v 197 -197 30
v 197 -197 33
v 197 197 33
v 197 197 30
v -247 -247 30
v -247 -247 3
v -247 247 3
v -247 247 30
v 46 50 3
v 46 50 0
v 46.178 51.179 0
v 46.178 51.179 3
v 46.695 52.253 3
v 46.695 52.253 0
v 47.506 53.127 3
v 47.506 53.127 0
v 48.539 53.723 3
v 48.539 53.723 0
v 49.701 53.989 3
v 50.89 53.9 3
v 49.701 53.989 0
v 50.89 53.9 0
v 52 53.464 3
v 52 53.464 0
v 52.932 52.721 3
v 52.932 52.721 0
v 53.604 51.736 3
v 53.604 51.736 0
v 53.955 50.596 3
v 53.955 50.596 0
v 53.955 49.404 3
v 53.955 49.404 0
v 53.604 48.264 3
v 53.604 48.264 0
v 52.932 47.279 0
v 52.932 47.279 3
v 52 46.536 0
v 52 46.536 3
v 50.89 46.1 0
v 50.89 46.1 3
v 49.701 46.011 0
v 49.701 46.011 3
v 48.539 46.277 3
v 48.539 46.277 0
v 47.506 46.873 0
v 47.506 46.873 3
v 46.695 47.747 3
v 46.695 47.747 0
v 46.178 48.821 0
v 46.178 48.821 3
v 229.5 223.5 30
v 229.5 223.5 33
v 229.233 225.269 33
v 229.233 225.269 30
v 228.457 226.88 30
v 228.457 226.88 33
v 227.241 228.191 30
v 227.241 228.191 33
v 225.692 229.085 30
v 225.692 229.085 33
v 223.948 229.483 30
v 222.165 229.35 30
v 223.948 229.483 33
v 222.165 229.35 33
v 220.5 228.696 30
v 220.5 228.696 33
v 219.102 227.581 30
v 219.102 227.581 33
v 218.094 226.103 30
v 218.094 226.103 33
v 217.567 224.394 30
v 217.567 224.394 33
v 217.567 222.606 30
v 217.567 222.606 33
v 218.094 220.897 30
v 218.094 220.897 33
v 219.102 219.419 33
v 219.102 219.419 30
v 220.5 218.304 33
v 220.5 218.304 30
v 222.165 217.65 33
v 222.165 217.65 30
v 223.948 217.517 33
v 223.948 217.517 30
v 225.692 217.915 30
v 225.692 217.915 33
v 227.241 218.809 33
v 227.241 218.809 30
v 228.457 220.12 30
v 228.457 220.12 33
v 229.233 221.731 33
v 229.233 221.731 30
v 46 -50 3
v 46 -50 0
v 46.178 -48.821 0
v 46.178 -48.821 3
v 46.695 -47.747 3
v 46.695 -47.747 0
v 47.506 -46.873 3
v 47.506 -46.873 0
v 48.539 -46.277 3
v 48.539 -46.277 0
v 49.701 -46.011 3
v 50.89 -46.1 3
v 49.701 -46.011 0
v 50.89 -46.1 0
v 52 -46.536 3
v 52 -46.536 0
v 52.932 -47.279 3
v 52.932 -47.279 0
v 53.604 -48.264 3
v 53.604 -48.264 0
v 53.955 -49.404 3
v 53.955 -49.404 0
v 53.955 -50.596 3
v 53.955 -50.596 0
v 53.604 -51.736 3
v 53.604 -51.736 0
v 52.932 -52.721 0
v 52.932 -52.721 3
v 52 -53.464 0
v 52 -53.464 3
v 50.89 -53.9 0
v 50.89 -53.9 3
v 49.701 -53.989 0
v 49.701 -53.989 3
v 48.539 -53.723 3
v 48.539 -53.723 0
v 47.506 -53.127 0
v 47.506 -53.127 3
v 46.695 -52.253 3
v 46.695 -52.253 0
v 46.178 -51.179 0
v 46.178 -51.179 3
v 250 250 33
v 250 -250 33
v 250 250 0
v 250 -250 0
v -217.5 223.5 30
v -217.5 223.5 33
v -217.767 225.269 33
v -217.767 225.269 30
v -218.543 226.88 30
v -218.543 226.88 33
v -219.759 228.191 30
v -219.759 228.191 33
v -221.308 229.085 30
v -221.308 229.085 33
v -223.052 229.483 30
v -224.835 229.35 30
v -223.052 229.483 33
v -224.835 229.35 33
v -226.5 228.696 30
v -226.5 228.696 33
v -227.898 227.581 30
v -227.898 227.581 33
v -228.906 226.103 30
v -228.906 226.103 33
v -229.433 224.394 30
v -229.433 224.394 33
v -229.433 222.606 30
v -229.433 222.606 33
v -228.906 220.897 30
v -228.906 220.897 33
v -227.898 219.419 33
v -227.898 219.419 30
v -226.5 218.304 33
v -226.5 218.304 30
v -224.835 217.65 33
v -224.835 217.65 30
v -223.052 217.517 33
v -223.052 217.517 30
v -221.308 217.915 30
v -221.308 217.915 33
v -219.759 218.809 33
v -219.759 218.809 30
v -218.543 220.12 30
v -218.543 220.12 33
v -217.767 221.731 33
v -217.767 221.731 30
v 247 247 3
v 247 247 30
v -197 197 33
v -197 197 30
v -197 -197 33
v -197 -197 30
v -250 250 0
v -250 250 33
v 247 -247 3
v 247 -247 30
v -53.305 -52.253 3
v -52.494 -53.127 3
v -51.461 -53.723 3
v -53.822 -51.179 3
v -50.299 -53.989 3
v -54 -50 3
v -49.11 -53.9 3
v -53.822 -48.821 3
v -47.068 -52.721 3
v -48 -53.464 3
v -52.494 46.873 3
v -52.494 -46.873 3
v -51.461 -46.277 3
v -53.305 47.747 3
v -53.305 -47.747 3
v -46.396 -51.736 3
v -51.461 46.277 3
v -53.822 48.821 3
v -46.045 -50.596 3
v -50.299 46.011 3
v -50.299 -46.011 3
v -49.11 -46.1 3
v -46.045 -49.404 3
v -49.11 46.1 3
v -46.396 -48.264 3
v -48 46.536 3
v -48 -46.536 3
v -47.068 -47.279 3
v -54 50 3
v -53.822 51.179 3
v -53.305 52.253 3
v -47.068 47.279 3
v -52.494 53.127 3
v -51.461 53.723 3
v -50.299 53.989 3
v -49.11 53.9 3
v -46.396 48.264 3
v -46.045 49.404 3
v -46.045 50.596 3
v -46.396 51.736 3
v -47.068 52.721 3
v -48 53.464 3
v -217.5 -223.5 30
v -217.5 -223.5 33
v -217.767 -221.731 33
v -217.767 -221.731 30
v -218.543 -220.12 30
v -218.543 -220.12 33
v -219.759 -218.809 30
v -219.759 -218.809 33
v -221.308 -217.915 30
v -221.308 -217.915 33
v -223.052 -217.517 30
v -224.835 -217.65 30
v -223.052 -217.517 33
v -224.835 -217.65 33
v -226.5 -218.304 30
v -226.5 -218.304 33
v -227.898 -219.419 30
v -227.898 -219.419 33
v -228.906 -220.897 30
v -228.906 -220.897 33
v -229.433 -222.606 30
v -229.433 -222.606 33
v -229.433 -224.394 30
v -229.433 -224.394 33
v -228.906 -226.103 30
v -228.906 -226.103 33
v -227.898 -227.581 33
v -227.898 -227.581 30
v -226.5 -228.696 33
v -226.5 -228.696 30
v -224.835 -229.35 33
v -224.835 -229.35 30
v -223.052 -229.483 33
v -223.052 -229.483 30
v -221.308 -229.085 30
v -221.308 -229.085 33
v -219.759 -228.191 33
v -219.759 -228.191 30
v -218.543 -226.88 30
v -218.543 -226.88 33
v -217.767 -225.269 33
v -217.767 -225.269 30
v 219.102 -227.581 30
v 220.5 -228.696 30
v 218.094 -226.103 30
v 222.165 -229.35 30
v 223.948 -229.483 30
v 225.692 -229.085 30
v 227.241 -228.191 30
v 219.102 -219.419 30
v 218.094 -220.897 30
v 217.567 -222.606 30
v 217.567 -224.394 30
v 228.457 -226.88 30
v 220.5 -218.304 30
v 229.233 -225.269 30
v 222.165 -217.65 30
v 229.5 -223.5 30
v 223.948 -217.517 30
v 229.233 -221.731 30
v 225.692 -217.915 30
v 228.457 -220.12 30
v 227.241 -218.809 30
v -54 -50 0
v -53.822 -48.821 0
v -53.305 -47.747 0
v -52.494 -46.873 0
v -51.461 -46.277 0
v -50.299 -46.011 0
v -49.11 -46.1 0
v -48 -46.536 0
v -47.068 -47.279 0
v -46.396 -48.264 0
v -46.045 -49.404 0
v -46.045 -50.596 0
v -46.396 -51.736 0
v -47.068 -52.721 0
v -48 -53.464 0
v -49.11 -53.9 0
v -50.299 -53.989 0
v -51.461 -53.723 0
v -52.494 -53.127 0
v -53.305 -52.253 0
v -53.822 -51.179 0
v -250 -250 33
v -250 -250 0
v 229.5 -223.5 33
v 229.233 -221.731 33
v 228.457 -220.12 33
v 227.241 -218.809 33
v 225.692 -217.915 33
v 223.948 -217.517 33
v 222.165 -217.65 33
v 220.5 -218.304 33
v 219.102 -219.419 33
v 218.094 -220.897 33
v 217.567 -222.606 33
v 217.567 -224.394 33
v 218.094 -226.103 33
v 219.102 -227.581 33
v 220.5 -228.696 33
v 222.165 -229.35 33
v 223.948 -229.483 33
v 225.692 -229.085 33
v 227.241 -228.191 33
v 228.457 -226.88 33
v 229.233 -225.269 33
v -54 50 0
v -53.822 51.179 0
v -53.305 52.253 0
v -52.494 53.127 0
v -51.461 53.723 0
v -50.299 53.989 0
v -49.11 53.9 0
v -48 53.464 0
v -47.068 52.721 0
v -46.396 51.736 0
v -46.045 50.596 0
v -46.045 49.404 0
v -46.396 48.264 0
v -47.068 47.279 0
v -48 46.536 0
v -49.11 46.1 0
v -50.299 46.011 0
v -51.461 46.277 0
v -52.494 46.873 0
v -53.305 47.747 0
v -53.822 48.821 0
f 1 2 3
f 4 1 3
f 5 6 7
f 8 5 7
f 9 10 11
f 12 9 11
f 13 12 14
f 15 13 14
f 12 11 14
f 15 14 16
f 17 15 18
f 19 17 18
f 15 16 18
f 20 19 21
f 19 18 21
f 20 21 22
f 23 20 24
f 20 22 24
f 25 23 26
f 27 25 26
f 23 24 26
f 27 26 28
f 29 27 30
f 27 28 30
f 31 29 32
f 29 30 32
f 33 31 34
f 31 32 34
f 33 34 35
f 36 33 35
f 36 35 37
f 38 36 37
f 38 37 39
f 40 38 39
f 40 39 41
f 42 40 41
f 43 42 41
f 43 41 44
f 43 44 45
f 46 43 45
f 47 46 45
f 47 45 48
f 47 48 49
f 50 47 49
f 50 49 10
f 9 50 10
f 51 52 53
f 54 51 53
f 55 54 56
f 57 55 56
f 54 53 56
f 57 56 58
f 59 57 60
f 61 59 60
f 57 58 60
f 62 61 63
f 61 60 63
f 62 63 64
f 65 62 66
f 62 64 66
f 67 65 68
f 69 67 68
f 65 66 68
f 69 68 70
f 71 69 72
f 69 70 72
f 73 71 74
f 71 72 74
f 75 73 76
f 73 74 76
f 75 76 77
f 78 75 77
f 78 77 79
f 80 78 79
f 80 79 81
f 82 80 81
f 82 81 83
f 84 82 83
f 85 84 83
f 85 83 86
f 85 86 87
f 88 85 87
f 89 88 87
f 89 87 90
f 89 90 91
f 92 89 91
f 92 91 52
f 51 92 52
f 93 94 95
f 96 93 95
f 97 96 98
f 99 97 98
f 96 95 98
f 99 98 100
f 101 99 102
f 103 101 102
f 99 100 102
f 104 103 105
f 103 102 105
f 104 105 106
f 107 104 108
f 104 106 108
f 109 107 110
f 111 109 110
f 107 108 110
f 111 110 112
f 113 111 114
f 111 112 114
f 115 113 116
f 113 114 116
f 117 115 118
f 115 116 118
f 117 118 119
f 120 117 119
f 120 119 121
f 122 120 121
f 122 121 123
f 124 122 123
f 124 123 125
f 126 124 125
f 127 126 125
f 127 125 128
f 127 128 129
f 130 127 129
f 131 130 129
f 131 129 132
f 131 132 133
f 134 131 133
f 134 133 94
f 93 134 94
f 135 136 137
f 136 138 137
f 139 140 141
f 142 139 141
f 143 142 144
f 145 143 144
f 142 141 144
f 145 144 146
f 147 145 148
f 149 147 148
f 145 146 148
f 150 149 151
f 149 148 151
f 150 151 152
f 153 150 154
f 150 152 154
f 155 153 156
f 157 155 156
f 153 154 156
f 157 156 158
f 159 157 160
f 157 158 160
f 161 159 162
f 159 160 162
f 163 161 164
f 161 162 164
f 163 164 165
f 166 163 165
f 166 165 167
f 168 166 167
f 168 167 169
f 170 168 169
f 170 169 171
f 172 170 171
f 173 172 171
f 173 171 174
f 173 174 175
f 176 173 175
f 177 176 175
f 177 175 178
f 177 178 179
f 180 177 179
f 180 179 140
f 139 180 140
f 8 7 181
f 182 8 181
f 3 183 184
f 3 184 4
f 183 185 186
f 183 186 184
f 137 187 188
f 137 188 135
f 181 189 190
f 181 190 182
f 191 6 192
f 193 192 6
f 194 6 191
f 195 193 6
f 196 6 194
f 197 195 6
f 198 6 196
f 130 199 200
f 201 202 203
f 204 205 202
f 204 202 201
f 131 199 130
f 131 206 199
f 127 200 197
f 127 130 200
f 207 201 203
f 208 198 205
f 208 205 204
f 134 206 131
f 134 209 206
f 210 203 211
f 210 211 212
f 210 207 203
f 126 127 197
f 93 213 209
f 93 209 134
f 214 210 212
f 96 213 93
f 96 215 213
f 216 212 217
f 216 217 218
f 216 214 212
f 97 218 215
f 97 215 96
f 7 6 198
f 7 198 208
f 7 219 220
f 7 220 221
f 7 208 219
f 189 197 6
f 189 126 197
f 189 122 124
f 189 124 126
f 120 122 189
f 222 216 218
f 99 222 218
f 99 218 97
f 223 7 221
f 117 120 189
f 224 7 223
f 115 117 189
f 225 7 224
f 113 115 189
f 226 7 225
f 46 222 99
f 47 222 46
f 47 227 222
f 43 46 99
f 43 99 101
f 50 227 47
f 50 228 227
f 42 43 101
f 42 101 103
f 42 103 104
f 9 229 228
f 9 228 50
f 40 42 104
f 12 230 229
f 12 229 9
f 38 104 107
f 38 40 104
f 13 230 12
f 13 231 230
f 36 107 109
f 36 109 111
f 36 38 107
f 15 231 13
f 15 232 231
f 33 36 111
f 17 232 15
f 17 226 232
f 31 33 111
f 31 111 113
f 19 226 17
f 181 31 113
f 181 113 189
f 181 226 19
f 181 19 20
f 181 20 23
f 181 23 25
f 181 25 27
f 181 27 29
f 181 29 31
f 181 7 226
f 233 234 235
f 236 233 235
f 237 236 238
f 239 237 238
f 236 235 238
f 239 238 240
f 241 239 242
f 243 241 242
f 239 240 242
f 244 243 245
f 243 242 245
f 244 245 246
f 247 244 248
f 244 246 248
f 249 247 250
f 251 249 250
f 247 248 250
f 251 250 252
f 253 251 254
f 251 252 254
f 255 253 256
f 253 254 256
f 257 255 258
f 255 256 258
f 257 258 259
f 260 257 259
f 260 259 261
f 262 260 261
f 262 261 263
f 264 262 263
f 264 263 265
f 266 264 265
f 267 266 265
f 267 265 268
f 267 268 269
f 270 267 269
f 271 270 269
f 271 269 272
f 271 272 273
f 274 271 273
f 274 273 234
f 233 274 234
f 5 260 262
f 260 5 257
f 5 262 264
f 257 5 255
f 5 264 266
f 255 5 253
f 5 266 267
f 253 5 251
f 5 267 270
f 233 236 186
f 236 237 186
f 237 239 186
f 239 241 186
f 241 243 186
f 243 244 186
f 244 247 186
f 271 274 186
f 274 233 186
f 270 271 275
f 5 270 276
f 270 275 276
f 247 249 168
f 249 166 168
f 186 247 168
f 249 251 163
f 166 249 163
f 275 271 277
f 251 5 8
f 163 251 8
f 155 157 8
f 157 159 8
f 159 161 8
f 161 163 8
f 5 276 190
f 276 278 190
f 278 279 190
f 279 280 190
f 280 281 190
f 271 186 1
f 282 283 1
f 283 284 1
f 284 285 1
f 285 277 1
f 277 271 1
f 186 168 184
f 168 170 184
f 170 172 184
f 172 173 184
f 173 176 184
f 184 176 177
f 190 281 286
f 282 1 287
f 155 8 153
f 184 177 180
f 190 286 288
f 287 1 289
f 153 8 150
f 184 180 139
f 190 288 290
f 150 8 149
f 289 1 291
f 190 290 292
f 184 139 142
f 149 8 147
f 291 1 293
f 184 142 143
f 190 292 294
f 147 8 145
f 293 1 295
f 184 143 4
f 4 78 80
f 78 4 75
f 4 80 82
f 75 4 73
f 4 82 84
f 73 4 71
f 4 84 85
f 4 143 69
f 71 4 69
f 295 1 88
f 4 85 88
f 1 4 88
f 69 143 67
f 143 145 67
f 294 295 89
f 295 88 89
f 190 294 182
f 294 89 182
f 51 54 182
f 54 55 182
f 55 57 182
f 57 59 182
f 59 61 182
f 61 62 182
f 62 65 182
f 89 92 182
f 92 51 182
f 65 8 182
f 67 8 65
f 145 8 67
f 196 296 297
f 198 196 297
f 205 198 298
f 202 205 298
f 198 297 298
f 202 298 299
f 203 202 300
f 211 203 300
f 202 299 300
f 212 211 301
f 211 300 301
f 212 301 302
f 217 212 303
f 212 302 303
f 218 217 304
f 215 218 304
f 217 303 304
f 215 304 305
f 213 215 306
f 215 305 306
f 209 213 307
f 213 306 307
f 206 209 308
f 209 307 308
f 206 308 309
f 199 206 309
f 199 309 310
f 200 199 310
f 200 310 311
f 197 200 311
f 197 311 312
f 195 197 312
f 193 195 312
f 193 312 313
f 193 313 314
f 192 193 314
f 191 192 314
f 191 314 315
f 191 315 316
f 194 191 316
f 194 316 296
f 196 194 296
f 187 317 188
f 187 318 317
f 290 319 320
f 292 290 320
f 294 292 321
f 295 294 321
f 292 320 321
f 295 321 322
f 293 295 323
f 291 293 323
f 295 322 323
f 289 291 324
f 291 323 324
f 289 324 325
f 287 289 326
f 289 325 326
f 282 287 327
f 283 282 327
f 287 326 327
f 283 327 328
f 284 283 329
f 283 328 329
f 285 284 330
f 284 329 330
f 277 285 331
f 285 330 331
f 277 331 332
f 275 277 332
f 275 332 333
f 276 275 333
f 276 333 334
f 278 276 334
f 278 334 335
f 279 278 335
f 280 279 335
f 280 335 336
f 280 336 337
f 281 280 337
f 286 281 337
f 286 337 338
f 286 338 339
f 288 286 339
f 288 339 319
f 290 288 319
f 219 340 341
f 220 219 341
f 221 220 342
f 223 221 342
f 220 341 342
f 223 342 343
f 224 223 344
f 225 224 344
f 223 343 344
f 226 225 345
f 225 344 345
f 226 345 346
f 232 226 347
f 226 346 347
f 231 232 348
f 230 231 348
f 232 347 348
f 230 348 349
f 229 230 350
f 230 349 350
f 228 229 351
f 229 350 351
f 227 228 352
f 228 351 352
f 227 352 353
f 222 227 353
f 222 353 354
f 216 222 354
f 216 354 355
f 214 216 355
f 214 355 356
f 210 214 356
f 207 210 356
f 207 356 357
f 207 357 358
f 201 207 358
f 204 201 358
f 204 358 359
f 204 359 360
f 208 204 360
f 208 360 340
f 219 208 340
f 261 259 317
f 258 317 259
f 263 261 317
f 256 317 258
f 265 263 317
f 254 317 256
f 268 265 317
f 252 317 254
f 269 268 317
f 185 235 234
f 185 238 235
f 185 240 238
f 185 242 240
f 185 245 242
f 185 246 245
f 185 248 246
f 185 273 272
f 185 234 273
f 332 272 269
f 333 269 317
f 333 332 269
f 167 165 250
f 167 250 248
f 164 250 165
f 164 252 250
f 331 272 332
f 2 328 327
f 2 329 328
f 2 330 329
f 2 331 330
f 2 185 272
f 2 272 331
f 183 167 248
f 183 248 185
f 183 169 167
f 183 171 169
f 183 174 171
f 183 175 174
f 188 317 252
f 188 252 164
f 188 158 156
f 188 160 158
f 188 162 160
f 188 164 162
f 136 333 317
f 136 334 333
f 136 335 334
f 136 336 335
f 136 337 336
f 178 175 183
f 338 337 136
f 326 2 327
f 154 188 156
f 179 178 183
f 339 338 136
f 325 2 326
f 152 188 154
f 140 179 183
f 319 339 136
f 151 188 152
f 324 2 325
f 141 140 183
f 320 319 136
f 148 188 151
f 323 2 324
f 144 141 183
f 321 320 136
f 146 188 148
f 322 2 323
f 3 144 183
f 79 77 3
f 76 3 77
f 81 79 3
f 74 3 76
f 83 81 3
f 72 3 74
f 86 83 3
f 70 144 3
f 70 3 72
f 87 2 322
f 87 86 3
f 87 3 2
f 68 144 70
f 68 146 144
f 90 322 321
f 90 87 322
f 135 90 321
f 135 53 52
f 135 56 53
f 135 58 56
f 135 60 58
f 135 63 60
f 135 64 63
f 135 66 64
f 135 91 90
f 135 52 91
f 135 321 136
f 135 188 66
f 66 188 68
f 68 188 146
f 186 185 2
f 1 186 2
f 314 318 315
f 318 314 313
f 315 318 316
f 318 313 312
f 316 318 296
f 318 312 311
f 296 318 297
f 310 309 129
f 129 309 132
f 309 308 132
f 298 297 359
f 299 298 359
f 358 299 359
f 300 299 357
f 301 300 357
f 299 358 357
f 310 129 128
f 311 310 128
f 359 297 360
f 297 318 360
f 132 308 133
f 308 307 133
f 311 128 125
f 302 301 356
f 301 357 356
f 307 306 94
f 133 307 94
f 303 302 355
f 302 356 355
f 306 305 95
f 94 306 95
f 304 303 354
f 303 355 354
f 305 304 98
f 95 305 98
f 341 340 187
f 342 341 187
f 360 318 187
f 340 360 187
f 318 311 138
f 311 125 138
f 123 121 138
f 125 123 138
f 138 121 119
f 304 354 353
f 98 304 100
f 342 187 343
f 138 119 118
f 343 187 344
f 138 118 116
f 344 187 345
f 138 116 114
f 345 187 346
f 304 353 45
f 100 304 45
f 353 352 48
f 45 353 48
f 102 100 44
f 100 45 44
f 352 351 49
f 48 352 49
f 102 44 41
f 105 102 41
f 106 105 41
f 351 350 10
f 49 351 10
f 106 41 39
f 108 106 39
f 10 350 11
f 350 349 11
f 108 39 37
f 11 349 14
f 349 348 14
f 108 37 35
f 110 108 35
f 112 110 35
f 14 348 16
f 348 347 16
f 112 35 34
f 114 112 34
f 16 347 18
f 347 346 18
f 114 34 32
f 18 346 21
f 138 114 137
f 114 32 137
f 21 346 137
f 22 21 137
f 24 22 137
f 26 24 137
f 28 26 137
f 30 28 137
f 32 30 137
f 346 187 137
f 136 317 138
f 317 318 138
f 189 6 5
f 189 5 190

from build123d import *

# Parameters (mm, degrees)
SKETCH1_W           = 500
SKETCH1_H           = 500
BOSS_EXTRUDE1_DEPTH = 3
CUT_EXTRUDE1_REACH  = 355.566
SKETCH3_R           = 4
SKETCH4_W           = 500
SKETCH4_H           = 500
SKETCH4_W_2         = 494
SKETCH4_H_2         = 494
BOSS_EXTRUDE2_DEPTH = 30
SKETCH5_W           = 494
SKETCH5_H           = 494
SKETCH5_W_2         = 394
SKETCH5_H_2         = 394
BOSS_EXTRUDE3_DEPTH = 3
CUT_EXTRUDE2_REACH  = 357.09
SKETCH6_R           = 6


with BuildPart() as part:
    # Sketch1 → Boss-Extrude1 (new body)
    with BuildSketch(Plane.XY):
        Rectangle(SKETCH1_W, SKETCH1_H)
    extrude(amount=BOSS_EXTRUDE1_DEPTH)

    # Sketch3 → Cut-Extrude1 (cut, up to next)
    with BuildSketch(Plane(origin=(0, 0, 0), x_dir=(-1, 0, 0), z_dir=(0, 0, -1)), mode=Mode.PRIVATE) as cut_extrude1_sk1:
        with Locations((50, 50)):
            Circle(SKETCH3_R)
    cut_extrude1_tool1 = extrude(cut_extrude1_sk1.sketch, amount=-CUT_EXTRUDE1_REACH, mode=Mode.PRIVATE) & part.part
    # Sketch3 → Cut-Extrude1 (cut, up to next)
    with BuildSketch(Plane(origin=(0, 0, 0), x_dir=(-1, 0, 0), z_dir=(0, 0, -1)), mode=Mode.PRIVATE) as cut_extrude1_sk2:
        with Locations((-50, 50)):
            Circle(SKETCH3_R)
    cut_extrude1_tool2 = extrude(cut_extrude1_sk2.sketch, amount=-CUT_EXTRUDE1_REACH, mode=Mode.PRIVATE) & part.part
    # Sketch3 → Cut-Extrude1 (cut, up to next)
    with BuildSketch(Plane(origin=(0, 0, 0), x_dir=(-1, 0, 0), z_dir=(0, 0, -1)), mode=Mode.PRIVATE) as cut_extrude1_sk3:
        with Locations((50, -50)):
            Circle(SKETCH3_R)
    cut_extrude1_tool3 = extrude(cut_extrude1_sk3.sketch, amount=-CUT_EXTRUDE1_REACH, mode=Mode.PRIVATE) & part.part
    # Sketch3 → Cut-Extrude1 (cut, up to next)
    with BuildSketch(Plane(origin=(0, 0, 0), x_dir=(-1, 0, 0), z_dir=(0, 0, -1)), mode=Mode.PRIVATE) as cut_extrude1_sk4:
        with Locations((-50, -50)):
            Circle(SKETCH3_R)
    cut_extrude1_tool4 = extrude(cut_extrude1_sk4.sketch, amount=-CUT_EXTRUDE1_REACH, mode=Mode.PRIVATE) & part.part
    add(cut_extrude1_tool1.solids().sort_by_distance((-50, 50, 0))[0], mode=Mode.SUBTRACT)
    add(cut_extrude1_tool2.solids().sort_by_distance((50, 50, 0))[0], mode=Mode.SUBTRACT)
    add(cut_extrude1_tool3.solids().sort_by_distance((-50, -50, 0))[0], mode=Mode.SUBTRACT)
    add(cut_extrude1_tool4.solids().sort_by_distance((50, -50, 0))[0], mode=Mode.SUBTRACT)

    # Sketch4 → Boss-Extrude2 (add)
    with BuildSketch(Plane.XY.offset(3)):
        Rectangle(SKETCH4_W, SKETCH4_H)
        Rectangle(SKETCH4_W_2, SKETCH4_H_2, mode=Mode.SUBTRACT)
    extrude(amount=BOSS_EXTRUDE2_DEPTH)

    # Sketch5 → Boss-Extrude3 (add)
    with BuildSketch(Plane.XY.offset(33)):
        Rectangle(SKETCH5_W, SKETCH5_H)
        Rectangle(SKETCH5_W_2, SKETCH5_H_2, mode=Mode.SUBTRACT)
    extrude(amount=-BOSS_EXTRUDE3_DEPTH)

    # Sketch6 → Cut-Extrude2 (cut, up to next)
    with BuildSketch(Plane.XY.offset(33), mode=Mode.PRIVATE) as cut_extrude2_sk1:
        with Locations((-223.5, 223.5)):
            Circle(SKETCH6_R)
    cut_extrude2_tool1 = extrude(cut_extrude2_sk1.sketch, amount=-CUT_EXTRUDE2_REACH, mode=Mode.PRIVATE) & part.part
    # Sketch6 → Cut-Extrude2 (cut, up to next)
    with BuildSketch(Plane.XY.offset(33), mode=Mode.PRIVATE) as cut_extrude2_sk2:
        with Locations((223.5, 223.5)):
            Circle(SKETCH6_R)
    cut_extrude2_tool2 = extrude(cut_extrude2_sk2.sketch, amount=-CUT_EXTRUDE2_REACH, mode=Mode.PRIVATE) & part.part
    # Sketch6 → Cut-Extrude2 (cut, up to next)
    with BuildSketch(Plane.XY.offset(33), mode=Mode.PRIVATE) as cut_extrude2_sk3:
        with Locations((223.5, -223.5)):
            Circle(SKETCH6_R)
    cut_extrude2_tool3 = extrude(cut_extrude2_sk3.sketch, amount=-CUT_EXTRUDE2_REACH, mode=Mode.PRIVATE) & part.part
    # Sketch6 → Cut-Extrude2 (cut, up to next)
    with BuildSketch(Plane.XY.offset(33), mode=Mode.PRIVATE) as cut_extrude2_sk4:
        with Locations((-223.5, -223.5)):
            Circle(SKETCH6_R)
    cut_extrude2_tool4 = extrude(cut_extrude2_sk4.sketch, amount=-CUT_EXTRUDE2_REACH, mode=Mode.PRIVATE) & part.part
    add(cut_extrude2_tool1.solids().sort_by_distance((-223.5, 223.5, 33))[0], mode=Mode.SUBTRACT)
    add(cut_extrude2_tool2.solids().sort_by_distance((223.5, 223.5, 33))[0], mode=Mode.SUBTRACT)
    add(cut_extrude2_tool3.solids().sort_by_distance((223.5, -223.5, 33))[0], mode=Mode.SUBTRACT)
    add(cut_extrude2_tool4.solids().sort_by_distance((-223.5, -223.5, 33))[0], mode=Mode.SUBTRACT)


solid = part.part
